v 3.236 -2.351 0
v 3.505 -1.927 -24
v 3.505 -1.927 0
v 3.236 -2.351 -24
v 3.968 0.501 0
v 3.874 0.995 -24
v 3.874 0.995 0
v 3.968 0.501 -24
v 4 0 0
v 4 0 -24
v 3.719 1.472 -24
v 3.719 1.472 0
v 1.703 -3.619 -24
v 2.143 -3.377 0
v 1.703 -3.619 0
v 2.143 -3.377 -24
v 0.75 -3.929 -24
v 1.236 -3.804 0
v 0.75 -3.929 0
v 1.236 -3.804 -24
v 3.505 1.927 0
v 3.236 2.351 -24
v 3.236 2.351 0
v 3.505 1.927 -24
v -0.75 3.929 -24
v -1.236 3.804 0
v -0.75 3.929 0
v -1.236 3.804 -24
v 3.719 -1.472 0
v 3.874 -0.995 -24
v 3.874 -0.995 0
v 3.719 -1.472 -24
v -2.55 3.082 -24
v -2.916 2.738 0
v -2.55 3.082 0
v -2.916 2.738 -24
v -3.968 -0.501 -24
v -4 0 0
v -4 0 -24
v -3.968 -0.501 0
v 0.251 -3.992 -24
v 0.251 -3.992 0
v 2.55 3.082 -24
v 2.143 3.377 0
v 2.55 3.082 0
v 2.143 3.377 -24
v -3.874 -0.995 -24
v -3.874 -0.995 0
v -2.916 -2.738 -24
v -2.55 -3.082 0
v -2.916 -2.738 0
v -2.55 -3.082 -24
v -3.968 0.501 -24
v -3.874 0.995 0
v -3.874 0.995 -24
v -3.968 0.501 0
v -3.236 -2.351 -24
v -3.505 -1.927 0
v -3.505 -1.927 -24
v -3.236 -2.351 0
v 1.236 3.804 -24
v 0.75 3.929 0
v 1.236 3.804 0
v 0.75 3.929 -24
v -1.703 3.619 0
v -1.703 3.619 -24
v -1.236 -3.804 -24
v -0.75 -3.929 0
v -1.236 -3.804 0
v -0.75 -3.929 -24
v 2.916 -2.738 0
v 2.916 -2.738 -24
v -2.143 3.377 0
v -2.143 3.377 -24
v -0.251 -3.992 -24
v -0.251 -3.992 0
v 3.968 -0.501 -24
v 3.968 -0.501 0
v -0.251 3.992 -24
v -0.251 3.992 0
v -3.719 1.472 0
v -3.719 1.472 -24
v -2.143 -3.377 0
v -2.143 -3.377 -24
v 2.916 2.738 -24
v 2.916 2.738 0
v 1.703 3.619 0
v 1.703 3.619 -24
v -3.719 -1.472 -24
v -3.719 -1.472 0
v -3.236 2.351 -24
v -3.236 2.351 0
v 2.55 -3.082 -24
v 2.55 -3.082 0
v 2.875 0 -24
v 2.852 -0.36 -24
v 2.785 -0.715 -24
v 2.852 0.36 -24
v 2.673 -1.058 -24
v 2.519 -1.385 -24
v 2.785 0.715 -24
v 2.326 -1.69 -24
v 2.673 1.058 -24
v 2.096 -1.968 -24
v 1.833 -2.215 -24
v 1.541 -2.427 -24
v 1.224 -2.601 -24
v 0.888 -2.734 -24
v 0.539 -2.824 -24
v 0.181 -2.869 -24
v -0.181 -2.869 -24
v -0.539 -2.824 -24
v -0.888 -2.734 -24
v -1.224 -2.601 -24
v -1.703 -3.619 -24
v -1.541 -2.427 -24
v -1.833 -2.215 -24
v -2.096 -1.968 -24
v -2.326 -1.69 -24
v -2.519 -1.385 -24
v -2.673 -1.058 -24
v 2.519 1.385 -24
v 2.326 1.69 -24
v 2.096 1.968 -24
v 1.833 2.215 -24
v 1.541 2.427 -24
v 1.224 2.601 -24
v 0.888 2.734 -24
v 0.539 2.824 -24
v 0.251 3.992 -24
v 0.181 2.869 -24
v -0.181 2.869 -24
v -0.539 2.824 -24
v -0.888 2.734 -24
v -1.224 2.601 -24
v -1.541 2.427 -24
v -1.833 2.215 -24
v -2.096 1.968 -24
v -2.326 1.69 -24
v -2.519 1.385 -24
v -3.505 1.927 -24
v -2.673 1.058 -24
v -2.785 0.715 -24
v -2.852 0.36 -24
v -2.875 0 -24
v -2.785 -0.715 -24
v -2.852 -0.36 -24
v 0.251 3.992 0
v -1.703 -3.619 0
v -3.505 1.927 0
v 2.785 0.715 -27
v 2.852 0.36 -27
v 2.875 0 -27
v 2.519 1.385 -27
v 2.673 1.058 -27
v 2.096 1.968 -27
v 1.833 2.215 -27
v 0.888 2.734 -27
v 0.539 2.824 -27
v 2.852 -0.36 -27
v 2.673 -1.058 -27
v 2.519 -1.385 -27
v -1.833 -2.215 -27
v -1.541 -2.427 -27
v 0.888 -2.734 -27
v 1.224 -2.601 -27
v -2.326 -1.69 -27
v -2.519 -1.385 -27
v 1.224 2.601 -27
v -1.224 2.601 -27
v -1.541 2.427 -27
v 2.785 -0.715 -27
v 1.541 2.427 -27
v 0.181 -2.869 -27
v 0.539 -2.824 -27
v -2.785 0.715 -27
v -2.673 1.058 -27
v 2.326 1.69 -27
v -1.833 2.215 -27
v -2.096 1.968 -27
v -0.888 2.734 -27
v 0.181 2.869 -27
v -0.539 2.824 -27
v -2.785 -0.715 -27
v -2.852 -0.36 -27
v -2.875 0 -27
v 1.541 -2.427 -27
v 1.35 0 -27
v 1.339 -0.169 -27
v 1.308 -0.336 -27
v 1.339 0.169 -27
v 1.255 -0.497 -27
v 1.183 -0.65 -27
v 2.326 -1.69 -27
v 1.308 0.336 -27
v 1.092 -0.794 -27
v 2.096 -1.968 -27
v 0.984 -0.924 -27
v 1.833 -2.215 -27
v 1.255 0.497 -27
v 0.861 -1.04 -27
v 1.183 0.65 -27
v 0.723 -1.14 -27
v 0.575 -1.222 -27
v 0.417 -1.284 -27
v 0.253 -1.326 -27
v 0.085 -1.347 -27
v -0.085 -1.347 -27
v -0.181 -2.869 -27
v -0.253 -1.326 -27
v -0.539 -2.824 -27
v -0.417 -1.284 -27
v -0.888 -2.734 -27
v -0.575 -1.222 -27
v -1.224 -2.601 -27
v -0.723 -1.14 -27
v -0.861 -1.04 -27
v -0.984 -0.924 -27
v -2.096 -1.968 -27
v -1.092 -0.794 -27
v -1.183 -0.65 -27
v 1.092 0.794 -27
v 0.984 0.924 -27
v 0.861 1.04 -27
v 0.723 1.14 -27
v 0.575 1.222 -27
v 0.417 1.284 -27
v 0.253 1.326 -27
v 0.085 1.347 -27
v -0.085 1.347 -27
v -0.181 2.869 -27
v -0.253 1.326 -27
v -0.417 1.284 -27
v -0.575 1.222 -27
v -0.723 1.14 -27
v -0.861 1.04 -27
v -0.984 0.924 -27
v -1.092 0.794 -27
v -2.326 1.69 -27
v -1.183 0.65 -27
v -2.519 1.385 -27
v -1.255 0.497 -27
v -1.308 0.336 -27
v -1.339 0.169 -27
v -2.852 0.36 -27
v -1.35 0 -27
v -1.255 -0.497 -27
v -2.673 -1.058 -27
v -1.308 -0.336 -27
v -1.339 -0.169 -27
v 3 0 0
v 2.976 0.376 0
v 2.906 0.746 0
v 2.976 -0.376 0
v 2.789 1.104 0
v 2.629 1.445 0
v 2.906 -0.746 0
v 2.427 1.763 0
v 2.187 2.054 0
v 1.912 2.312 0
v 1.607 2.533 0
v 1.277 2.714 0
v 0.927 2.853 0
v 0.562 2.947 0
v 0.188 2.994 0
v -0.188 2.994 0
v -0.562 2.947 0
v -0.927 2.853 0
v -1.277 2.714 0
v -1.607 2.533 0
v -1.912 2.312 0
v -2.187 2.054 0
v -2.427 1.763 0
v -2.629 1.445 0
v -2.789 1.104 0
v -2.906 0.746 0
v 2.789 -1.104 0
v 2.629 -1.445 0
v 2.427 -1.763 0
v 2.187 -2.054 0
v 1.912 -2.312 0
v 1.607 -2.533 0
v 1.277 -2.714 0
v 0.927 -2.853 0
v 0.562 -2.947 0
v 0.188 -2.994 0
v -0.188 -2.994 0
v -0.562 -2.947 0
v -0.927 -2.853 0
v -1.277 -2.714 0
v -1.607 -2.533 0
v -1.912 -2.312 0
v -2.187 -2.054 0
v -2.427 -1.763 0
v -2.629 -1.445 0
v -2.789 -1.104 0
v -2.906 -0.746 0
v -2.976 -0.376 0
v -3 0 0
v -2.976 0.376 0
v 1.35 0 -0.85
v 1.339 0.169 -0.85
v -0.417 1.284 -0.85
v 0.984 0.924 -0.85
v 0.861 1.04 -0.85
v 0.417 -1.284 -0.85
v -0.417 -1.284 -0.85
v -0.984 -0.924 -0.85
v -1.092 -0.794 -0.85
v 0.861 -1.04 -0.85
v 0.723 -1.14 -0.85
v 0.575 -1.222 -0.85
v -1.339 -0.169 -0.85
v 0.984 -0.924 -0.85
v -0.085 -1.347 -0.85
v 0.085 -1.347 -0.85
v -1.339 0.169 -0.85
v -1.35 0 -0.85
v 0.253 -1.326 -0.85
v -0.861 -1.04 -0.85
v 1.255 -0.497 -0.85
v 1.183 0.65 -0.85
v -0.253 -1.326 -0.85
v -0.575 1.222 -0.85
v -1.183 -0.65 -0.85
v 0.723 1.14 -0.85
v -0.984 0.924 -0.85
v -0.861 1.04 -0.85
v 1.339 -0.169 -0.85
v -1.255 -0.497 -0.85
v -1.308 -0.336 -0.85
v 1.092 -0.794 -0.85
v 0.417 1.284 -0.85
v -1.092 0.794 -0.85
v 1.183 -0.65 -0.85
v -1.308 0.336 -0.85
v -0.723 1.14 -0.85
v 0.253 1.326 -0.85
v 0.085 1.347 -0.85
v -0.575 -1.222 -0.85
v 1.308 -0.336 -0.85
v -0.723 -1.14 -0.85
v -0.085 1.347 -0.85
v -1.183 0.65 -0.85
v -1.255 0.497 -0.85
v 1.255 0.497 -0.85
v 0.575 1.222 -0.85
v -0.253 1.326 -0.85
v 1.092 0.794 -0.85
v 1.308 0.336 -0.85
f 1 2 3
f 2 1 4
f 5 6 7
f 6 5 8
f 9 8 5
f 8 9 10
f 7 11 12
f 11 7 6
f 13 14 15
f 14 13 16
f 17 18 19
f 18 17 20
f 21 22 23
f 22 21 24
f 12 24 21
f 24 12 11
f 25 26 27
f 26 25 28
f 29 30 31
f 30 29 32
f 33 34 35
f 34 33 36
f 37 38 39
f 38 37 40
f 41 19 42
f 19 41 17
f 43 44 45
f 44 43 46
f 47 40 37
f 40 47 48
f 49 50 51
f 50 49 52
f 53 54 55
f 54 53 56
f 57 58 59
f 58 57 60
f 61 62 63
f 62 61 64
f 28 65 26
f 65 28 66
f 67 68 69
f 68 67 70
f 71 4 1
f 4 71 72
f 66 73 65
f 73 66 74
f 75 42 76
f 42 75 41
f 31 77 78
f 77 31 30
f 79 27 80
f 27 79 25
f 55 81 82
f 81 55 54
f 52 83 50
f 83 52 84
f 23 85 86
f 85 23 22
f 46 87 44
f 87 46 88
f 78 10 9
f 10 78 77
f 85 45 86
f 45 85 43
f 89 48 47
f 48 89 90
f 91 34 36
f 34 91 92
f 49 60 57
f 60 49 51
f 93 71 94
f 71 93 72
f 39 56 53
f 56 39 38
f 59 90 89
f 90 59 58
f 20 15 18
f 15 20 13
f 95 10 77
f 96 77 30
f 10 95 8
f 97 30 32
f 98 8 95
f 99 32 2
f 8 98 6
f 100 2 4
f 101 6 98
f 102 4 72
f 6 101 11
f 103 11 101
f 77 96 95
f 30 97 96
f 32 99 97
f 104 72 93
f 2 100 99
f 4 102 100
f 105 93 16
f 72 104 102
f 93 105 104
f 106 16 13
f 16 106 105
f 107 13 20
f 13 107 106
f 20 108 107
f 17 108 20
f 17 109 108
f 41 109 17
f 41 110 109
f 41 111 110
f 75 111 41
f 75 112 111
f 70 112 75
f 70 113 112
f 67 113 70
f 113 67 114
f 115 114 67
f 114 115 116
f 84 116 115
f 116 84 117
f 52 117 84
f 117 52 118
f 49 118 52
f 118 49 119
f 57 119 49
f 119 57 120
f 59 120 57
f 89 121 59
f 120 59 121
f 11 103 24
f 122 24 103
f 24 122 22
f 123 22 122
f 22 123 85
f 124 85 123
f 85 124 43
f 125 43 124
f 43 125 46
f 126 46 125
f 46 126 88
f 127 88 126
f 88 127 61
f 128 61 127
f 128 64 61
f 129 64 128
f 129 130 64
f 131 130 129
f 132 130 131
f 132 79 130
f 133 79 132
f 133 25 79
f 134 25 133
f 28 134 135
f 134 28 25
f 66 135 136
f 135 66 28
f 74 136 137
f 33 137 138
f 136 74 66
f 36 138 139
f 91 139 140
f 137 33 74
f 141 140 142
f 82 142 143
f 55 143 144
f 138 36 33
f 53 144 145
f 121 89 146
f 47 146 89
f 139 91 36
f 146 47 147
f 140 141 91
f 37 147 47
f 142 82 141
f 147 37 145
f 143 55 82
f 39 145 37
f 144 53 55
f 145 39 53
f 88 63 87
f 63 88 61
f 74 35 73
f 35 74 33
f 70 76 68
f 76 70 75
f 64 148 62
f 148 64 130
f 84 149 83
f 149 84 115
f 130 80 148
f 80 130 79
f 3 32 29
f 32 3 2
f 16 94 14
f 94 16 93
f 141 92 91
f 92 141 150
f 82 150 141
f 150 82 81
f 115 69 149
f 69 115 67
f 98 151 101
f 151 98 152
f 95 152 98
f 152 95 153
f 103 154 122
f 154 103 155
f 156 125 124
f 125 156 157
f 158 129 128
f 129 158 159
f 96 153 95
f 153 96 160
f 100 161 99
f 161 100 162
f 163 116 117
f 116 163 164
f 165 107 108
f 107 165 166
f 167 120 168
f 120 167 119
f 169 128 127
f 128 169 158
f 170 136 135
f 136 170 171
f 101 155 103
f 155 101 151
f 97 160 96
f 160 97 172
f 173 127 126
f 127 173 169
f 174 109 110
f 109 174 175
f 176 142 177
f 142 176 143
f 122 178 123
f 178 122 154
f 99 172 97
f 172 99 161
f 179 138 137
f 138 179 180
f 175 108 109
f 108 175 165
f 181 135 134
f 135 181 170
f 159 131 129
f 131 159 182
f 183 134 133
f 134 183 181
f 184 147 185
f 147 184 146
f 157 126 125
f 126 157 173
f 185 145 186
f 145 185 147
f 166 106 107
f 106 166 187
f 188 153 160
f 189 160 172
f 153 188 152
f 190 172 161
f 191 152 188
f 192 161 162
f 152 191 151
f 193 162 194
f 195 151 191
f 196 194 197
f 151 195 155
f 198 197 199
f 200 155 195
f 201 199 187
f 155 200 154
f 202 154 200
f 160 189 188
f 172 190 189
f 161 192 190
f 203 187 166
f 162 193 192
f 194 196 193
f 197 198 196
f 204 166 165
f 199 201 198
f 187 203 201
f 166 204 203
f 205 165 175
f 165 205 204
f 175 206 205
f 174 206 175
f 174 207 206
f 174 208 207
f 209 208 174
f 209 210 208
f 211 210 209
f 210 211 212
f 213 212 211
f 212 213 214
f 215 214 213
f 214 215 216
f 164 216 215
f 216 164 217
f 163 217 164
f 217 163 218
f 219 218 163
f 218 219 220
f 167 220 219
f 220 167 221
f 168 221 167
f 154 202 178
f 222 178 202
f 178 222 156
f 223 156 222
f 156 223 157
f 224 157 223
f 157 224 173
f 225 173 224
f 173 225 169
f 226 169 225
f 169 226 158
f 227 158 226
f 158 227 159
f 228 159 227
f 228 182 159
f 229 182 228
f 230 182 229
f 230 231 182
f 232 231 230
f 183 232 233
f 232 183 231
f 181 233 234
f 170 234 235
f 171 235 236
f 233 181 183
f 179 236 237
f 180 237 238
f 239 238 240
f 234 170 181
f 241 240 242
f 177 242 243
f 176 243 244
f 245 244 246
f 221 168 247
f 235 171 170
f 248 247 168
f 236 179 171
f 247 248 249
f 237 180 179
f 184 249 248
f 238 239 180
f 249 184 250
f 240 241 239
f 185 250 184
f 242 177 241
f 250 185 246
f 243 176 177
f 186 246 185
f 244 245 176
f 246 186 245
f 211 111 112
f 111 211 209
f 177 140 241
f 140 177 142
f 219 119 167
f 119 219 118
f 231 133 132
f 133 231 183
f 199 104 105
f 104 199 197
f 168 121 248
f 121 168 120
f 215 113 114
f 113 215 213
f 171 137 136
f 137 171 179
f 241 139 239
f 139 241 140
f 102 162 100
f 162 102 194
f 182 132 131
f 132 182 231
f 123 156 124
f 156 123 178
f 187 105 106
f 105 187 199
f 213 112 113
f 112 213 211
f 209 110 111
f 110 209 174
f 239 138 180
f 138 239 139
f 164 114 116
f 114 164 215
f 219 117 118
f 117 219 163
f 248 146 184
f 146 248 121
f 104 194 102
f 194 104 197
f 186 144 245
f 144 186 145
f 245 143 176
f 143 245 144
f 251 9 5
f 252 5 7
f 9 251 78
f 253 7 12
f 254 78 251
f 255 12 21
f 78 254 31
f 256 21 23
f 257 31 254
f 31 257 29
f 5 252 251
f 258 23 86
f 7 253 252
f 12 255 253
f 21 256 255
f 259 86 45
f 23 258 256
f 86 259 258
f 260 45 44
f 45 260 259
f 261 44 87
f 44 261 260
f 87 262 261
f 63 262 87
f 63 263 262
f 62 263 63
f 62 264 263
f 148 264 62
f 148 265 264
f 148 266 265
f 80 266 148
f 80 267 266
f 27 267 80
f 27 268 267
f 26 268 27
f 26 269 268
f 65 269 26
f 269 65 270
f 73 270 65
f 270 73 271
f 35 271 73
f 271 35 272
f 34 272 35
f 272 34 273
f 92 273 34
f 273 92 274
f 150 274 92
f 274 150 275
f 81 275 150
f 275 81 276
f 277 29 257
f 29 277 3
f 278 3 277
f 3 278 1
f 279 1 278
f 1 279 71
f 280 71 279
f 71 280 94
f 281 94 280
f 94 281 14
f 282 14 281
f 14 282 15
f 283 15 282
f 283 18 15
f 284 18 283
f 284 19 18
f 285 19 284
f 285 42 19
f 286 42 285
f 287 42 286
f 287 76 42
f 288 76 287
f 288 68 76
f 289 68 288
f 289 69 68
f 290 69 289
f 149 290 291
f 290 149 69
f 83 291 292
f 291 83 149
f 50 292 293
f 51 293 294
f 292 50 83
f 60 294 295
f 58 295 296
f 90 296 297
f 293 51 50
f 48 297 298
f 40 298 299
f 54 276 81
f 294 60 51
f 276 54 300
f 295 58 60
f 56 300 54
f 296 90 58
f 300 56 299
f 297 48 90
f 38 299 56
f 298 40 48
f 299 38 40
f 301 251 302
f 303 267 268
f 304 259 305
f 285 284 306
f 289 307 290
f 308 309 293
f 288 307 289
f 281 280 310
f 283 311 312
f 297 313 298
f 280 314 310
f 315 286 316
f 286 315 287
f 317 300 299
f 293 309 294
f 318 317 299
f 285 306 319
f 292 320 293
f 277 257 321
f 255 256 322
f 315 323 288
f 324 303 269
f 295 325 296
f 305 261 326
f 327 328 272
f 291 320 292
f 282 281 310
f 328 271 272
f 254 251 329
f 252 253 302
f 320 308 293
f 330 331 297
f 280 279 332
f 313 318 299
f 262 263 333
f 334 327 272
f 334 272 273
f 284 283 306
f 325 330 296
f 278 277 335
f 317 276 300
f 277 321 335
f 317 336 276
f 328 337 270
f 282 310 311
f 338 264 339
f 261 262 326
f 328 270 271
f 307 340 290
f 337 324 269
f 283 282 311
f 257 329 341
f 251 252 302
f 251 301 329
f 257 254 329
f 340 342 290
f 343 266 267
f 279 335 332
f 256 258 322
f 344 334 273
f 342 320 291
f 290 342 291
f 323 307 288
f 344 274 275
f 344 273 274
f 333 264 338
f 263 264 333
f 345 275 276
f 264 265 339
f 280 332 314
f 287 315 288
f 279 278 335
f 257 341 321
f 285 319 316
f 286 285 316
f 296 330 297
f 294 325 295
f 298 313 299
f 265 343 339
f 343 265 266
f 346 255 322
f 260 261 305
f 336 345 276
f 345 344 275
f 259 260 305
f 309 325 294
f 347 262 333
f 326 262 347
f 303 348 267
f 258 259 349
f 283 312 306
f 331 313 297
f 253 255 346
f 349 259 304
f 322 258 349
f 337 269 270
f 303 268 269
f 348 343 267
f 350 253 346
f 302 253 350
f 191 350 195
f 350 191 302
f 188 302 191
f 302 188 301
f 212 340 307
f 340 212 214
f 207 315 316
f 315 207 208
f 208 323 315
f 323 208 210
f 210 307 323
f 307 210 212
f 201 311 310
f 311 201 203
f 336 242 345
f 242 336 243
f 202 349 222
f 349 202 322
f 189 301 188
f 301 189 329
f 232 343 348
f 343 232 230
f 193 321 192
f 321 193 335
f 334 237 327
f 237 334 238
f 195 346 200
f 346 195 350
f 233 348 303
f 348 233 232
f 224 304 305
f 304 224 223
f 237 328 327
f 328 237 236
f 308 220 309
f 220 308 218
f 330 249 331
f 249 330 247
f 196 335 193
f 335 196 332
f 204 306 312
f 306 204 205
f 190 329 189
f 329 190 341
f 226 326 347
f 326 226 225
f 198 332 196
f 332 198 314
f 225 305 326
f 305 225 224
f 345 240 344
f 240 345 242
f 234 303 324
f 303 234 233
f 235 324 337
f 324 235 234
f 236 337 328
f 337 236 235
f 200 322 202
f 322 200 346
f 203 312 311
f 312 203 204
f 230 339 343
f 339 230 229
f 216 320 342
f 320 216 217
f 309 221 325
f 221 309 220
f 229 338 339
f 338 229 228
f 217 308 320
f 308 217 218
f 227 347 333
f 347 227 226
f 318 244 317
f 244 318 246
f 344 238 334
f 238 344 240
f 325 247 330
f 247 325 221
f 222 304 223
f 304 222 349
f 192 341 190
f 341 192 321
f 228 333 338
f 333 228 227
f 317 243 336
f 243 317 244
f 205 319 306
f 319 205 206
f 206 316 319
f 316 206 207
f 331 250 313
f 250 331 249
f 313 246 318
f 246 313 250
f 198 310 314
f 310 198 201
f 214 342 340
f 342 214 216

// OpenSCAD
$fn = 50;

difference() {
	union() {
		translate(v = [0, 0, -24.0]) {
			cylinder(h = 27, r = 4.0);
		}
		#translate(v = [0, 0, -27.0]) {
			cylinder(h = 27, r = 2.875);
		}
	}
	union() {
		translate(v = [0, 0, 0]) {
			rotate(a = [0, 0, 0]) {
				difference() {
					union() {
						translate(v = [0, 0, -27.0]) {
							cylinder(h = 27, r = 1.0);
						}
						translate(v = [0, 0, -0.85]) {
							cylinder(h = 0.85, r1 = 1.35, r2 = 3.0);
						}
						translate(v = [0, 0, -27.0]) {
							cylinder(h = 27, r = 1.35);
						}
						translate(v = [0, 0, -27.0]) {
							cylinder(h = 27, r = 1.0);
						}
					}
					union();
				}
			}
		}
		#cylinder(h = 3, r = 5.0);
	}
}
